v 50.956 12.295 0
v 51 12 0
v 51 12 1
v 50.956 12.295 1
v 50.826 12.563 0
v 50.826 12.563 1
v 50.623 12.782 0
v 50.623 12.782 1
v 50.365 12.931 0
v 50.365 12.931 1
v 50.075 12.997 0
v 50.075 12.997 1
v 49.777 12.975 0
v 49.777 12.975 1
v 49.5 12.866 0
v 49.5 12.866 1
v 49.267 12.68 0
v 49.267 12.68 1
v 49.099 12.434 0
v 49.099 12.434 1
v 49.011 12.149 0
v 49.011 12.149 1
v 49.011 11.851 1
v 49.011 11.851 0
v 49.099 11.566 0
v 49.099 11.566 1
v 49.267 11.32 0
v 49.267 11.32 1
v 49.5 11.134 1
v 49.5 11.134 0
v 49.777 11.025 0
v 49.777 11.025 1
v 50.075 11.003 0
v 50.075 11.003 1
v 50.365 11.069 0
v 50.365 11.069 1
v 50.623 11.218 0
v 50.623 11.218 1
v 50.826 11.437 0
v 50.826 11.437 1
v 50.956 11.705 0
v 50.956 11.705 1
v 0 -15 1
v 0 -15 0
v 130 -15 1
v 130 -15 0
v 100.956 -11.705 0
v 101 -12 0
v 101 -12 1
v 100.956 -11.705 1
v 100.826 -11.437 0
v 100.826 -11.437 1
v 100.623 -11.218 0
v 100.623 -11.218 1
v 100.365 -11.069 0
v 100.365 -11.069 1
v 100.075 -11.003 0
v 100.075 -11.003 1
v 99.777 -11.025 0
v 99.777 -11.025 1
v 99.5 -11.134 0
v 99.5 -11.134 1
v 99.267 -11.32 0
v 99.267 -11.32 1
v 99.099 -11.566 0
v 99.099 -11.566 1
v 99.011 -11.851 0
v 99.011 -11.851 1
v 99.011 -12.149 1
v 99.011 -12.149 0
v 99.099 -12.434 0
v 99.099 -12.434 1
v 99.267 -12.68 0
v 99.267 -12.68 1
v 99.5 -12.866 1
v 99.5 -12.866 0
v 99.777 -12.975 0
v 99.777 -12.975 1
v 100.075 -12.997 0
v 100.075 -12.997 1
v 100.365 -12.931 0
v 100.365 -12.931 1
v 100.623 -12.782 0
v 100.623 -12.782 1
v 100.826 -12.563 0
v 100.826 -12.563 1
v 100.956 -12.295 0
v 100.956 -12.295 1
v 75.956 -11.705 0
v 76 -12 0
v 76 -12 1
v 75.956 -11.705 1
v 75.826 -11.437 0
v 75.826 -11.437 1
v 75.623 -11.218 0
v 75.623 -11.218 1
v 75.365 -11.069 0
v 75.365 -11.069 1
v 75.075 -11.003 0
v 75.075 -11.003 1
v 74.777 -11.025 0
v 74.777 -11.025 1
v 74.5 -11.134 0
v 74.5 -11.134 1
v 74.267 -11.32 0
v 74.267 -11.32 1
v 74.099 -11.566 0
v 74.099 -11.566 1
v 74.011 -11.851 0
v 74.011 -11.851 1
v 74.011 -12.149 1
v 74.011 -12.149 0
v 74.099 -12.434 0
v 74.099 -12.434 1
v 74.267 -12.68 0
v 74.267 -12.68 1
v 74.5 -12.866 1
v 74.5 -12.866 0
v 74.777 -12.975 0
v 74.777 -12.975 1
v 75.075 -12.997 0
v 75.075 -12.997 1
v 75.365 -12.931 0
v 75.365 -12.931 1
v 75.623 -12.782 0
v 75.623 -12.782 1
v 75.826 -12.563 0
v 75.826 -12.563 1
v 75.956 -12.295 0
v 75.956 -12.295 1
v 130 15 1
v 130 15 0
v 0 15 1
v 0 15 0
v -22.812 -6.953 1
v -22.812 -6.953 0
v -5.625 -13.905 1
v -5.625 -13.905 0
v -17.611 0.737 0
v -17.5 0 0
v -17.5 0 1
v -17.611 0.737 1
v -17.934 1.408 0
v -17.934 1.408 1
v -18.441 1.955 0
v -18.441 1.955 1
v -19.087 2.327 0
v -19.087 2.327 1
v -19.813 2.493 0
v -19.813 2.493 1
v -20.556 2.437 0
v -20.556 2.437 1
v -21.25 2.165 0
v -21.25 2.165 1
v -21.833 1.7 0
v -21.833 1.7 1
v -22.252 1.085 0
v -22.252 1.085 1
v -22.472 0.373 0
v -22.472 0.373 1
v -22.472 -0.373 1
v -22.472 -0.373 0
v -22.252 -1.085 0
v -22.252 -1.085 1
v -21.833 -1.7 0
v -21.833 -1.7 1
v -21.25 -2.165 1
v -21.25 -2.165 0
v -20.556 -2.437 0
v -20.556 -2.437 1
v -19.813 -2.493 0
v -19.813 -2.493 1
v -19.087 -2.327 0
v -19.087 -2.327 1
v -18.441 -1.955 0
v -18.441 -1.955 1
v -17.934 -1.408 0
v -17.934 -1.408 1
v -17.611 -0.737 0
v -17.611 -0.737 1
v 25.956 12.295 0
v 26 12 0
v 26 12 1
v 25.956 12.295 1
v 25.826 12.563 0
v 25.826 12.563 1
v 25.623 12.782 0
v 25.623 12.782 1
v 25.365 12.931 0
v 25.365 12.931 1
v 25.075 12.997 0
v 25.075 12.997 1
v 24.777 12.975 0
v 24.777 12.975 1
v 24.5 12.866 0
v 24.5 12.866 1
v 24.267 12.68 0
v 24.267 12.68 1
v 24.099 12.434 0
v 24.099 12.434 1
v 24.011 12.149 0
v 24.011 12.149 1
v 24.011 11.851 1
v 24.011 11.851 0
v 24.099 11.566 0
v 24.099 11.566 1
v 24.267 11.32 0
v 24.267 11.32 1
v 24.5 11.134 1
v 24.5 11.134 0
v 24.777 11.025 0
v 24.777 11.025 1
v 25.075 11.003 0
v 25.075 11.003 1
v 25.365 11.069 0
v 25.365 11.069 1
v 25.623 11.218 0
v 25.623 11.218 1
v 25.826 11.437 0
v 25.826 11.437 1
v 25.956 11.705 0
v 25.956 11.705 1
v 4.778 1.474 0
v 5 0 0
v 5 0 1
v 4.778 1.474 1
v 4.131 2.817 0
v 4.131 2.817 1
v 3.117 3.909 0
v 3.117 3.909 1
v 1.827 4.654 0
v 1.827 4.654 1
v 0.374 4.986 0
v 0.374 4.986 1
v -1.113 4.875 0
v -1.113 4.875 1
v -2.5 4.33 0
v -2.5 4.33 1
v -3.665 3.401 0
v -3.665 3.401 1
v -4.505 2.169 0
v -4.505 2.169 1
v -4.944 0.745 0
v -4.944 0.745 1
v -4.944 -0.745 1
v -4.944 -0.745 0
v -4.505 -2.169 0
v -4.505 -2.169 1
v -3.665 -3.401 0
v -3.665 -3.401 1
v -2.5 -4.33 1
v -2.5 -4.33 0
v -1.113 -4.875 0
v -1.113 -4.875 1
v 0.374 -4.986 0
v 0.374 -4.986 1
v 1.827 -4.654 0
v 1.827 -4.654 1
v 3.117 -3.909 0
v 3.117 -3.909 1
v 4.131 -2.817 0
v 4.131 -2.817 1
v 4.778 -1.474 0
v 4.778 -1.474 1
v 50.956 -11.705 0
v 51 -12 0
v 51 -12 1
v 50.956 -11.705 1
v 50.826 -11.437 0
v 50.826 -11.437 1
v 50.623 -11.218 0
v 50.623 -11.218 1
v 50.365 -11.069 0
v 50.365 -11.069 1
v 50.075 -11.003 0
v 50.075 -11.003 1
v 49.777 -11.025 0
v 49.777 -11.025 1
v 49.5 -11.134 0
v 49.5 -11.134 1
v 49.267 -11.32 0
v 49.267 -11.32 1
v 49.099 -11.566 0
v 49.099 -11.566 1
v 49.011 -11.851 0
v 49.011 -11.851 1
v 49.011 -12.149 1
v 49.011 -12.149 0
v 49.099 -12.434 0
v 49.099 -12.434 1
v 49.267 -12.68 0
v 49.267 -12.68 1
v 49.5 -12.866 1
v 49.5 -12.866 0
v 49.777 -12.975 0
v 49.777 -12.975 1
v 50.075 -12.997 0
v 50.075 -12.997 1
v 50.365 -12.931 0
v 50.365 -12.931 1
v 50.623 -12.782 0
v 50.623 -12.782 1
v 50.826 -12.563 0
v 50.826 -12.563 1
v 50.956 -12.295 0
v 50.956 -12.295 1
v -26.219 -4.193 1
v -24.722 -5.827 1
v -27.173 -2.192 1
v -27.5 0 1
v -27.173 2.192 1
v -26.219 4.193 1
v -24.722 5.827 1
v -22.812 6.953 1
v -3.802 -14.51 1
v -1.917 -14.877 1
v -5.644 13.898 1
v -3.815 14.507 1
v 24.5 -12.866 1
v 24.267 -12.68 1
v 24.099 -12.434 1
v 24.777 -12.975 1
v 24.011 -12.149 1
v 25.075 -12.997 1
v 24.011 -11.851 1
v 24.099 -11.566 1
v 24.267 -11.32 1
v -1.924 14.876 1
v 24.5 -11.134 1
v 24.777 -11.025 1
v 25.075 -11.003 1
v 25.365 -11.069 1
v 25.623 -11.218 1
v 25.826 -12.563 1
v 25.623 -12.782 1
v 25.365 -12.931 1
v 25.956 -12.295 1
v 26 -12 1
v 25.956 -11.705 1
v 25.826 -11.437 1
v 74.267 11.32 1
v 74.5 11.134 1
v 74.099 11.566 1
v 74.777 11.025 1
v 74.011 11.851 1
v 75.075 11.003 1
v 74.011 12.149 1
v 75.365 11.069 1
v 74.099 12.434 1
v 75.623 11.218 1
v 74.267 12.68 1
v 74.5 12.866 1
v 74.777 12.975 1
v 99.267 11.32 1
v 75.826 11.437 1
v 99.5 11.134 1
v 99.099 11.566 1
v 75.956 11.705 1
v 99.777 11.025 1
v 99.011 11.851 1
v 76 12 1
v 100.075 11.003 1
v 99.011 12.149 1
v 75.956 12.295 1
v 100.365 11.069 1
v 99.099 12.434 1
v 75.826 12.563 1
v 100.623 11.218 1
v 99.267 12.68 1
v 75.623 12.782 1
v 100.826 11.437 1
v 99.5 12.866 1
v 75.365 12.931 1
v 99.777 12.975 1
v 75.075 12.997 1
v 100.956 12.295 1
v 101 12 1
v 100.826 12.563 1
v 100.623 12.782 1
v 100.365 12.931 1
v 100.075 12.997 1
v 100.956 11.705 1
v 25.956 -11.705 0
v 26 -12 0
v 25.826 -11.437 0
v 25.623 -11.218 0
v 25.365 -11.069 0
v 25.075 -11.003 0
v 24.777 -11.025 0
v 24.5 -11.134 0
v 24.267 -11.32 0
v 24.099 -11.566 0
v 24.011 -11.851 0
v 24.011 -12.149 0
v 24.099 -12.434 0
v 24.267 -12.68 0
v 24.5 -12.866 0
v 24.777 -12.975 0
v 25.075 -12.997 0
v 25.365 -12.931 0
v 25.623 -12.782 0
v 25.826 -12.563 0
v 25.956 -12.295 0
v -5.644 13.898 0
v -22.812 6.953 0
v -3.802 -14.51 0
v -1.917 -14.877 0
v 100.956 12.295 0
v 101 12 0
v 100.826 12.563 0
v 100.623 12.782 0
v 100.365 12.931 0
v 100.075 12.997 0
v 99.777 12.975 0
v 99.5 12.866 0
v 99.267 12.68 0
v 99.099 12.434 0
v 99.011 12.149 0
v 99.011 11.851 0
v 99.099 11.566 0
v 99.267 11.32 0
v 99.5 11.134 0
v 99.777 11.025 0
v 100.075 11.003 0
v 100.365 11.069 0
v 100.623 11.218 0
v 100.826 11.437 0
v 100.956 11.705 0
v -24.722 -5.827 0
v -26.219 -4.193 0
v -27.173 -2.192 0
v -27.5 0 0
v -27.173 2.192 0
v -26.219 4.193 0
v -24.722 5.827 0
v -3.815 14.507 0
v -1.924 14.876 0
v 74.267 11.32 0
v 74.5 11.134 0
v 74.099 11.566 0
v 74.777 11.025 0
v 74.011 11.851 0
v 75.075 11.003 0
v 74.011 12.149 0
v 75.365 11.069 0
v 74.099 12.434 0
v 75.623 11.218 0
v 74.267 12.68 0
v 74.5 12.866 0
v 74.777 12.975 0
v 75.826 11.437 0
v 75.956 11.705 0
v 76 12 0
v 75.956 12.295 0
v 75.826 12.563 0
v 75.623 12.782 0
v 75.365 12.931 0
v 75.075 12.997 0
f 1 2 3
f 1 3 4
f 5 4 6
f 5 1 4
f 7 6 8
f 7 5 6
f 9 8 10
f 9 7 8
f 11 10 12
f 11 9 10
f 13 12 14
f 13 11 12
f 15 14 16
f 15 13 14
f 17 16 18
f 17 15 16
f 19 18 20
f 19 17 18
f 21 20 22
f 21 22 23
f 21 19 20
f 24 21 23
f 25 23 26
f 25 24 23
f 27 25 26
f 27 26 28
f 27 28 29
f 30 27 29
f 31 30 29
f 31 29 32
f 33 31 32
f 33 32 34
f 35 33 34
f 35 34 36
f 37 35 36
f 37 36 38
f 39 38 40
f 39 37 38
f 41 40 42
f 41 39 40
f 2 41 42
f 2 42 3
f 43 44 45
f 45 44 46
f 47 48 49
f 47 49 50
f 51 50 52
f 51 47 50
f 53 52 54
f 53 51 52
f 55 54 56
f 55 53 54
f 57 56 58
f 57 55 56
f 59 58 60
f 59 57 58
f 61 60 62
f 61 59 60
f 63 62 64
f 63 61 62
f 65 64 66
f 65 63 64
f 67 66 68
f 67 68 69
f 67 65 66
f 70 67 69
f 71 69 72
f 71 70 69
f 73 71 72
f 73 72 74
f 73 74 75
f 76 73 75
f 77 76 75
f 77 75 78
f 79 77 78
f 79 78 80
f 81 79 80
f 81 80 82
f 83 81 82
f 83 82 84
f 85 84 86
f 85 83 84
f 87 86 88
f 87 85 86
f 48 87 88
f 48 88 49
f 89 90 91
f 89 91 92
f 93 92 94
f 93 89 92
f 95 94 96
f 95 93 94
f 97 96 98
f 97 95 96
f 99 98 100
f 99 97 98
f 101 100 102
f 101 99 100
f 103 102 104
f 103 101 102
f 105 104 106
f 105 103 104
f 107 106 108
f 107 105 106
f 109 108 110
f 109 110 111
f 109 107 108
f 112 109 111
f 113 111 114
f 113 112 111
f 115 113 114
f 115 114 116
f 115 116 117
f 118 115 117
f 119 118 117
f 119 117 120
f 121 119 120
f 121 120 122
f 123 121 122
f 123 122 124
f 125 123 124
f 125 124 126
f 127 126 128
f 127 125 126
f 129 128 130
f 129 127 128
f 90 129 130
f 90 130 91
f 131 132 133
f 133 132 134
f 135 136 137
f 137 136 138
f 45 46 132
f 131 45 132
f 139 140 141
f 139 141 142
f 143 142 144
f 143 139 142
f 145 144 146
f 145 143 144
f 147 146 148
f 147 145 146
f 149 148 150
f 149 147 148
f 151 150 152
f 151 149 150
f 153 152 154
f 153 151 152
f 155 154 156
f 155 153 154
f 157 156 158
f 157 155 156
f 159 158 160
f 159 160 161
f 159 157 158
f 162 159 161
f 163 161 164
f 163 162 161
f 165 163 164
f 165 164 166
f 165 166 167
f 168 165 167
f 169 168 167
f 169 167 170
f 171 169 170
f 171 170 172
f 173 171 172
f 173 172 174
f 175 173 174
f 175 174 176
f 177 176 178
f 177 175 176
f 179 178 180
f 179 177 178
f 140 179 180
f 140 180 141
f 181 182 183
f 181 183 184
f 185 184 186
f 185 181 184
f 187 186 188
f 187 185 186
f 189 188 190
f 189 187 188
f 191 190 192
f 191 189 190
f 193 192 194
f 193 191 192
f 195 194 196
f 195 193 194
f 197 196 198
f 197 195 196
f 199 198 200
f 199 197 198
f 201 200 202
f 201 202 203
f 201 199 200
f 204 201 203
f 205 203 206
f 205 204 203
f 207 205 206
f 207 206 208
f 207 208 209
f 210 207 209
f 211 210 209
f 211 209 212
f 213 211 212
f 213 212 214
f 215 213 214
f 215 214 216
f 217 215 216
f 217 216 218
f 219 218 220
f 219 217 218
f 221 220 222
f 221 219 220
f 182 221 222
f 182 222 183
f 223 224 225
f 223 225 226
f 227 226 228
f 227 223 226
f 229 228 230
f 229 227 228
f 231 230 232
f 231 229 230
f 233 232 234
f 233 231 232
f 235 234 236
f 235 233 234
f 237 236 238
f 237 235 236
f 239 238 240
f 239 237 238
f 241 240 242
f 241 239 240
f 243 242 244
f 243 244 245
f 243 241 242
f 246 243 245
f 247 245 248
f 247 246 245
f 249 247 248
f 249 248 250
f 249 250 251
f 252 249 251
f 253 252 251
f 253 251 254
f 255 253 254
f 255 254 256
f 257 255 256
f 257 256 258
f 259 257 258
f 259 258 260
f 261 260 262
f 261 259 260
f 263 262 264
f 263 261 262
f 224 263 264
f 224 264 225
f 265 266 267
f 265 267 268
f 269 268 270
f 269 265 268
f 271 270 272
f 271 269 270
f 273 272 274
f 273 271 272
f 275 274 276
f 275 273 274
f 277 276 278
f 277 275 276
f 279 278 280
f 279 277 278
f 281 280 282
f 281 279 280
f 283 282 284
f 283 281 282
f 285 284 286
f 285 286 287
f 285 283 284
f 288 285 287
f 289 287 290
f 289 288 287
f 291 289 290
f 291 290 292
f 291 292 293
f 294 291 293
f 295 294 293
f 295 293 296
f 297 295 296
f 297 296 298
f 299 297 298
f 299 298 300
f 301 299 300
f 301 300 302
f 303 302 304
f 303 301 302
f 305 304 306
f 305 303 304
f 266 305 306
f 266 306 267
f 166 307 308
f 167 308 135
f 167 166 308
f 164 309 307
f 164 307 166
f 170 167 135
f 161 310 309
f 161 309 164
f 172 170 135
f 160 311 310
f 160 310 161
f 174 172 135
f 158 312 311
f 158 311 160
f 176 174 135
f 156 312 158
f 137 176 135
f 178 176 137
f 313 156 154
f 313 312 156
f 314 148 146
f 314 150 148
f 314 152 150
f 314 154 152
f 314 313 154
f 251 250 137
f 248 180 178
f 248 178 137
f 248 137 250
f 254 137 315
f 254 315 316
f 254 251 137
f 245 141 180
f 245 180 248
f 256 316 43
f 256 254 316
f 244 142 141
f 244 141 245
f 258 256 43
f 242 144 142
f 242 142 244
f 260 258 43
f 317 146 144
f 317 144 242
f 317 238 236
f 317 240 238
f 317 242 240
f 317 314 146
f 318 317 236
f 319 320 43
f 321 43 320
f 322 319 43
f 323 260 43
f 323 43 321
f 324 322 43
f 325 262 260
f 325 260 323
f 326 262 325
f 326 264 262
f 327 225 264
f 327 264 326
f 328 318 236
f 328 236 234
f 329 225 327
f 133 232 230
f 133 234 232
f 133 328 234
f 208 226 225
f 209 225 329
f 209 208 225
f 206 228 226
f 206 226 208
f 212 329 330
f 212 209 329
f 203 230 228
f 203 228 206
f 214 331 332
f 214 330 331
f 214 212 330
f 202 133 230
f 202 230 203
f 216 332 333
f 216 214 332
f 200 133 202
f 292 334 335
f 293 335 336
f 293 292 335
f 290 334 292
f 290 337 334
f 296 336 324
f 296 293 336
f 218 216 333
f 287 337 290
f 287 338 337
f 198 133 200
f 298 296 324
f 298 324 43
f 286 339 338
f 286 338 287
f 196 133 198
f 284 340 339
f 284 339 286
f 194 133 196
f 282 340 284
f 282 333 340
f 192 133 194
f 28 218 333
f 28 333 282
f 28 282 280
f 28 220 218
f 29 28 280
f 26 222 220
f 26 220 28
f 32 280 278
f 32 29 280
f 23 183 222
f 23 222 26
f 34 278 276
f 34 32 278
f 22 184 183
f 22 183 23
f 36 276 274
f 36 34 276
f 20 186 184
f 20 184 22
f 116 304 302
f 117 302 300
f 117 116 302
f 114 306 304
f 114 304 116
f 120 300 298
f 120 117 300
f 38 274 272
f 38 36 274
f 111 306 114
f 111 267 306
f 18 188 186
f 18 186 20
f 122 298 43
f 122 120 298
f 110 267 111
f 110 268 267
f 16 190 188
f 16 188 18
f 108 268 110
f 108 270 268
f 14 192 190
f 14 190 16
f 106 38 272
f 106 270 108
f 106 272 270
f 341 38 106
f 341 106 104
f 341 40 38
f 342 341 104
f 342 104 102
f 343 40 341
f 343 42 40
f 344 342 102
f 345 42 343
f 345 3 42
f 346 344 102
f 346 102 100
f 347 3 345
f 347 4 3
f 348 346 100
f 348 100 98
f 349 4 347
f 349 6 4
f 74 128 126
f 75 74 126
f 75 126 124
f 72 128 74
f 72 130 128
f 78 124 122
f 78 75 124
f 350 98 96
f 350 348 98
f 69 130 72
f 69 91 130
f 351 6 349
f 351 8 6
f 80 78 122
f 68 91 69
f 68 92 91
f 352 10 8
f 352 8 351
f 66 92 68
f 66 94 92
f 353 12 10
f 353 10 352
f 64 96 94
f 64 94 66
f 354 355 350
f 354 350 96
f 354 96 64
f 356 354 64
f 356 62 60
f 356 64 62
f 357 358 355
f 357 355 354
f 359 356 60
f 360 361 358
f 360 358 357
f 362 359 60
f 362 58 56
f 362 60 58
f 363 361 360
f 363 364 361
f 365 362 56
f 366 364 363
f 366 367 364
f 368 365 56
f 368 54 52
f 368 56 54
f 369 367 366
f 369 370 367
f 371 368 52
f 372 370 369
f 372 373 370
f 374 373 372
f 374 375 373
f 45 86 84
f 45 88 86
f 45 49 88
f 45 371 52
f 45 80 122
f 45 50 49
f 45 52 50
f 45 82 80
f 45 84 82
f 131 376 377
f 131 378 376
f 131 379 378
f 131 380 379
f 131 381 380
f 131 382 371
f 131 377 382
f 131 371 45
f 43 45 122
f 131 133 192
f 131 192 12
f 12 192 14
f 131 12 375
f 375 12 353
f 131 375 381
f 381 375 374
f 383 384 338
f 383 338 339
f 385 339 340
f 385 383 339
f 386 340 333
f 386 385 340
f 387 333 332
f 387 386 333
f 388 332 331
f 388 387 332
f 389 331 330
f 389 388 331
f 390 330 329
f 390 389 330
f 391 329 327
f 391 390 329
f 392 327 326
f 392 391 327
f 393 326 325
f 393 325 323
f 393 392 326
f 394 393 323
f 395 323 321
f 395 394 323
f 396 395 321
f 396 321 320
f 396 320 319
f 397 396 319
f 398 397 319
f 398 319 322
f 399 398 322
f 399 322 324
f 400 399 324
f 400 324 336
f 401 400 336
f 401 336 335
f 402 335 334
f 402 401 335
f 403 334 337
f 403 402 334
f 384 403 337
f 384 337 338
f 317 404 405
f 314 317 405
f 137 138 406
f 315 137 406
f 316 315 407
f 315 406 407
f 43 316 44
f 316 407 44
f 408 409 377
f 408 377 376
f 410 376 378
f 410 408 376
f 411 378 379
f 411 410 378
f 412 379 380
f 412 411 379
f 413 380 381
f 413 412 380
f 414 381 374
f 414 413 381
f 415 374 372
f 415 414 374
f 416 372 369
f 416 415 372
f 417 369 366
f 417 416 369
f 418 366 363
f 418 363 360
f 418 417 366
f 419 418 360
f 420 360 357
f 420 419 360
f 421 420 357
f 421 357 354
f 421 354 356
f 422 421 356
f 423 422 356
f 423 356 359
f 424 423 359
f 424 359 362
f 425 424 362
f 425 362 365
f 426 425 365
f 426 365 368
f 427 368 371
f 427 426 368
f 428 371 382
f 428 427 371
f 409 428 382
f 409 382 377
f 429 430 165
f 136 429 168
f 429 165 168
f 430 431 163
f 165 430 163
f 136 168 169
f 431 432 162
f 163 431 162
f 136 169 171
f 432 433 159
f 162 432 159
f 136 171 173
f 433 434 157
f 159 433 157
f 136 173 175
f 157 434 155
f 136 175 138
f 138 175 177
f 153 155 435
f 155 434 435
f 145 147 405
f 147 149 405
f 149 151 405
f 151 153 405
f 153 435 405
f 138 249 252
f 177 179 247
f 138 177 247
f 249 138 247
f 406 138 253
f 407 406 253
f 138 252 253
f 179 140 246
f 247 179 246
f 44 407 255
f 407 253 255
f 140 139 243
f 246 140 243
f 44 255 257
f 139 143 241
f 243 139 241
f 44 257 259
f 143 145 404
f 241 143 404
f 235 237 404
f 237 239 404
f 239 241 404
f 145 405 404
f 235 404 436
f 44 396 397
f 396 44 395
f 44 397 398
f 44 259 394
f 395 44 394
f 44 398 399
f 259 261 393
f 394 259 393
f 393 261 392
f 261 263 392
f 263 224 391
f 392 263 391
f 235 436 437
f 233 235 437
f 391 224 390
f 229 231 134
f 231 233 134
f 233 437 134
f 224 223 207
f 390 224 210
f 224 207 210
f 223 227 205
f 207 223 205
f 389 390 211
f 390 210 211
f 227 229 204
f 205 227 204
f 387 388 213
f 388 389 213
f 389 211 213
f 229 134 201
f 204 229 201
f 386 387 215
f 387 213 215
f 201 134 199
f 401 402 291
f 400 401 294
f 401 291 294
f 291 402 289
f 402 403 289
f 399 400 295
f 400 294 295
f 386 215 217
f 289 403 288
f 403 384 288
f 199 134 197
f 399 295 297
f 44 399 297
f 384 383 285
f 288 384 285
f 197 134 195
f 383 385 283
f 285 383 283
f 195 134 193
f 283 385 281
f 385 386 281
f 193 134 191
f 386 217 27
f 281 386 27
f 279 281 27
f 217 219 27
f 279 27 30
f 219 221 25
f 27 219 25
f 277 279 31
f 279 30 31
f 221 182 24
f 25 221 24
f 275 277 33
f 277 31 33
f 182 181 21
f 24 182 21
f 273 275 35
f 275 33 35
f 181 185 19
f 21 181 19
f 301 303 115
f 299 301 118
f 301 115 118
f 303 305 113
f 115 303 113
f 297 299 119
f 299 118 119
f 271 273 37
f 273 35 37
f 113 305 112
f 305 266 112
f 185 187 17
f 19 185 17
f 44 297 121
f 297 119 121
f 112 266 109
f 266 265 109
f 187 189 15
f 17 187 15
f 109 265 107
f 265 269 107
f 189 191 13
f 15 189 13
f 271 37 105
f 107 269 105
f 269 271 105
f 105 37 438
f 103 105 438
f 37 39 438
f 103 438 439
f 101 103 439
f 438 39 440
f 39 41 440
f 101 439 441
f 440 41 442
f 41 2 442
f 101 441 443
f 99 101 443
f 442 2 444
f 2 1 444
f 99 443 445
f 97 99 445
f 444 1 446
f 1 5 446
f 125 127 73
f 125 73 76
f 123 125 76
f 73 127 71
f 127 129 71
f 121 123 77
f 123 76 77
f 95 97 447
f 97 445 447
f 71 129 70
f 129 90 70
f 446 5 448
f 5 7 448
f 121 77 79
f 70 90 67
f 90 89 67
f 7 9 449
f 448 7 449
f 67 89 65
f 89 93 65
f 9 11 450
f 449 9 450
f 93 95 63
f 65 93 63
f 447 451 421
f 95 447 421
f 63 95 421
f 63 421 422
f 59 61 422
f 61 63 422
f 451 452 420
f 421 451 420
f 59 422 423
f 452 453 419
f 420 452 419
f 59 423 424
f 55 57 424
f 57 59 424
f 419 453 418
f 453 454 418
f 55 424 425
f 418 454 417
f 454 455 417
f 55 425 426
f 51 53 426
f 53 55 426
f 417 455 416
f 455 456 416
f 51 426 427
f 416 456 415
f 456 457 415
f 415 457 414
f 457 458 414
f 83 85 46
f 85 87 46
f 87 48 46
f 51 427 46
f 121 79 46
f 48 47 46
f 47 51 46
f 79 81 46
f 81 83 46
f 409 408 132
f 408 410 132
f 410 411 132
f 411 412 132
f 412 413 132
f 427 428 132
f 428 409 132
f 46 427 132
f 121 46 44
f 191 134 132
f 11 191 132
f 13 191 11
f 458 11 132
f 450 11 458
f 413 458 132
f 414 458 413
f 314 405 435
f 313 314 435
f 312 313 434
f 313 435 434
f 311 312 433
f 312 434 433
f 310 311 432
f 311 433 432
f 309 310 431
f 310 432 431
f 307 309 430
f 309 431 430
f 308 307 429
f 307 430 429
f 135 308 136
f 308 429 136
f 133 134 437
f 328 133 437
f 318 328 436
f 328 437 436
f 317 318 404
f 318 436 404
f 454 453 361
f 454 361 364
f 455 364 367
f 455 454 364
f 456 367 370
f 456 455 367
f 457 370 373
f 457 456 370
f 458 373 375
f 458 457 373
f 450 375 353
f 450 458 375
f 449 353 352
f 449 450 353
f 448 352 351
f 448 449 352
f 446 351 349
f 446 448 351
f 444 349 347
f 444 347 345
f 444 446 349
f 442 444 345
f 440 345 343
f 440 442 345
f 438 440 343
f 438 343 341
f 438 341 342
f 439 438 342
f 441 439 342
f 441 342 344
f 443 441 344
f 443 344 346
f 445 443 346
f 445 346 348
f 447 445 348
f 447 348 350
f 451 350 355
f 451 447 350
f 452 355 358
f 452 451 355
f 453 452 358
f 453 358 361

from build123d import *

# Parameters (mm, degrees)
SKETCH_1_R      = 2.5
SKETCH_1_R_2    = 5
SKETCH_1_R_3    = 1
EXTRUDE_1_DEPTH = 1


with BuildPart() as part:
    # Эскиз1 → Бобышка-Вытянуть1 (new body)
    with BuildSketch(Plane.XY):
        with BuildLine():
            Line((-5.644333703, 13.897551295), (-22.8125, 6.952686082))
            ThreePointArc((-22.8125, 6.952686082), (-27.5, 0), (-22.8125, -6.952686082))
            Line((-22.8125, -6.952686082), (-5.625, -13.905372163))
            ThreePointArc((-5.625, -13.905372163), (-2.865258937, -14.723800162), (0, -15))
            Line((0, -15), (130, -15))
            Line((130, -15), (130, 15))
            Line((130, 15), (0, 15))
            ThreePointArc((0, 15), (-2.875496154, 14.721811827), (-5.644333703, 13.897551295))
        make_face()
        with Locations((-20, 0)):
            Circle(SKETCH_1_R, mode=Mode.SUBTRACT)
        with Locations((-3.8531e-05, 0)):
            Circle(SKETCH_1_R_2, mode=Mode.SUBTRACT)
        with Locations((25, 12)):
            Circle(SKETCH_1_R_3, mode=Mode.SUBTRACT)
        with Locations((50, 12)):
            Circle(SKETCH_1_R_3, mode=Mode.SUBTRACT)
        with Locations((75, 12)):
            Circle(SKETCH_1_R_3, mode=Mode.SUBTRACT)
        with Locations((100, 12)):
            Circle(SKETCH_1_R_3, mode=Mode.SUBTRACT)
        with Locations((25, -12)):
            Circle(SKETCH_1_R_3, mode=Mode.SUBTRACT)
        with Locations((50, -12)):
            Circle(SKETCH_1_R_3, mode=Mode.SUBTRACT)
        with Locations((75, -12)):
            Circle(SKETCH_1_R_3, mode=Mode.SUBTRACT)
        with Locations((100, -12)):
            Circle(SKETCH_1_R_3, mode=Mode.SUBTRACT)
    extrude(amount=EXTRUDE_1_DEPTH)


solid = part.part
